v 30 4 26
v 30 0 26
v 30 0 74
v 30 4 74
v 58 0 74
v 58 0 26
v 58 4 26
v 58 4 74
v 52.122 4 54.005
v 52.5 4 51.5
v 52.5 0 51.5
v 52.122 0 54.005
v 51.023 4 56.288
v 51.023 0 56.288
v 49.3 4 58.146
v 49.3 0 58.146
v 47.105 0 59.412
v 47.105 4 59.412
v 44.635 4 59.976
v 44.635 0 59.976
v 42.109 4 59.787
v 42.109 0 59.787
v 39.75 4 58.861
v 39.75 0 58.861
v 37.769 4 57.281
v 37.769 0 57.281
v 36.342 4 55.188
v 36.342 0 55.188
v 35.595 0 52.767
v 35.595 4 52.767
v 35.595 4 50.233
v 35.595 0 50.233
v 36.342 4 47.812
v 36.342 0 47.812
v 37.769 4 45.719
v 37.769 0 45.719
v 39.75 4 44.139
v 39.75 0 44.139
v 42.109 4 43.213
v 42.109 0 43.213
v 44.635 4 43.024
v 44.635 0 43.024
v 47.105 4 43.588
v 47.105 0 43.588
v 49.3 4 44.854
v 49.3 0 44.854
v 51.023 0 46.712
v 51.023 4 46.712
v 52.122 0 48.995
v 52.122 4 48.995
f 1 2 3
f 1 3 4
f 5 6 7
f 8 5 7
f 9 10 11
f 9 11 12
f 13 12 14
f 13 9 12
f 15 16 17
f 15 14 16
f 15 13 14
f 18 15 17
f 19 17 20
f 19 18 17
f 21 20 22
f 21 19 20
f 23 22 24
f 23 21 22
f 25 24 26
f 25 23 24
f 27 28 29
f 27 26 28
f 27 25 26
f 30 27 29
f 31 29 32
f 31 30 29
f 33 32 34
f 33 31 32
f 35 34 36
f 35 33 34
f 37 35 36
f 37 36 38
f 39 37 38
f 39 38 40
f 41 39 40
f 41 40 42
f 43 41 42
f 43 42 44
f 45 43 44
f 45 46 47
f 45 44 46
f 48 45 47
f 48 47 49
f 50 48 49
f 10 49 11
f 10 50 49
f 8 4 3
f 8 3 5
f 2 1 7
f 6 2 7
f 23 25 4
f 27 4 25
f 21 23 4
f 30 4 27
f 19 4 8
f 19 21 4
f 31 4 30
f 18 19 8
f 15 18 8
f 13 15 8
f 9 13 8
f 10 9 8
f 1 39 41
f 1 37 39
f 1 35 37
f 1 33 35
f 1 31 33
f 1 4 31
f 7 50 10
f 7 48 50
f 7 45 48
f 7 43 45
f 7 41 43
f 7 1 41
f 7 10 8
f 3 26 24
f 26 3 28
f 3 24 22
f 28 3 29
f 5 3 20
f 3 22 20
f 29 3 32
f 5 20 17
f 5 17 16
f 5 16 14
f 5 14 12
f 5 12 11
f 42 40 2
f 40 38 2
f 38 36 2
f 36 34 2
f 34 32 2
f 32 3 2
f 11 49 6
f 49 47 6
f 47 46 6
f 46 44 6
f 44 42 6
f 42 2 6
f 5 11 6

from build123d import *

# Parameters (mm, degrees)
CYLINDER881_R     = 8.5
CYLINDER881_DEPTH = 10
BOX425_W          = 28
BOX425_H          = 4
BOX425_DEPTH      = 48


with BuildPart() as v_lec881:
    # Cylinder881 → Cylinder881 (new body)
    with BuildSketch(Plane(origin=(44, 6, 51.5), x_dir=(1, 0, 0), z_dir=(0, -1, 0))):
        Circle(CYLINDER881_R)
    extrude(amount=CYLINDER881_DEPTH)


with BuildPart() as cut023:
    # Box425 → Box425 (new body)
    with BuildSketch(Plane(origin=(30, 0, 26), x_dir=(1, 0, 0), z_dir=(0, 0, 1))):
        with Locations((14, 2)):
            Rectangle(BOX425_W, BOX425_H)
    extrude(amount=BOX425_DEPTH)

    # Cut023: cut Válec881
    add(v_lec881.part, mode=Mode.SUBTRACT)


solid = cut023.part
